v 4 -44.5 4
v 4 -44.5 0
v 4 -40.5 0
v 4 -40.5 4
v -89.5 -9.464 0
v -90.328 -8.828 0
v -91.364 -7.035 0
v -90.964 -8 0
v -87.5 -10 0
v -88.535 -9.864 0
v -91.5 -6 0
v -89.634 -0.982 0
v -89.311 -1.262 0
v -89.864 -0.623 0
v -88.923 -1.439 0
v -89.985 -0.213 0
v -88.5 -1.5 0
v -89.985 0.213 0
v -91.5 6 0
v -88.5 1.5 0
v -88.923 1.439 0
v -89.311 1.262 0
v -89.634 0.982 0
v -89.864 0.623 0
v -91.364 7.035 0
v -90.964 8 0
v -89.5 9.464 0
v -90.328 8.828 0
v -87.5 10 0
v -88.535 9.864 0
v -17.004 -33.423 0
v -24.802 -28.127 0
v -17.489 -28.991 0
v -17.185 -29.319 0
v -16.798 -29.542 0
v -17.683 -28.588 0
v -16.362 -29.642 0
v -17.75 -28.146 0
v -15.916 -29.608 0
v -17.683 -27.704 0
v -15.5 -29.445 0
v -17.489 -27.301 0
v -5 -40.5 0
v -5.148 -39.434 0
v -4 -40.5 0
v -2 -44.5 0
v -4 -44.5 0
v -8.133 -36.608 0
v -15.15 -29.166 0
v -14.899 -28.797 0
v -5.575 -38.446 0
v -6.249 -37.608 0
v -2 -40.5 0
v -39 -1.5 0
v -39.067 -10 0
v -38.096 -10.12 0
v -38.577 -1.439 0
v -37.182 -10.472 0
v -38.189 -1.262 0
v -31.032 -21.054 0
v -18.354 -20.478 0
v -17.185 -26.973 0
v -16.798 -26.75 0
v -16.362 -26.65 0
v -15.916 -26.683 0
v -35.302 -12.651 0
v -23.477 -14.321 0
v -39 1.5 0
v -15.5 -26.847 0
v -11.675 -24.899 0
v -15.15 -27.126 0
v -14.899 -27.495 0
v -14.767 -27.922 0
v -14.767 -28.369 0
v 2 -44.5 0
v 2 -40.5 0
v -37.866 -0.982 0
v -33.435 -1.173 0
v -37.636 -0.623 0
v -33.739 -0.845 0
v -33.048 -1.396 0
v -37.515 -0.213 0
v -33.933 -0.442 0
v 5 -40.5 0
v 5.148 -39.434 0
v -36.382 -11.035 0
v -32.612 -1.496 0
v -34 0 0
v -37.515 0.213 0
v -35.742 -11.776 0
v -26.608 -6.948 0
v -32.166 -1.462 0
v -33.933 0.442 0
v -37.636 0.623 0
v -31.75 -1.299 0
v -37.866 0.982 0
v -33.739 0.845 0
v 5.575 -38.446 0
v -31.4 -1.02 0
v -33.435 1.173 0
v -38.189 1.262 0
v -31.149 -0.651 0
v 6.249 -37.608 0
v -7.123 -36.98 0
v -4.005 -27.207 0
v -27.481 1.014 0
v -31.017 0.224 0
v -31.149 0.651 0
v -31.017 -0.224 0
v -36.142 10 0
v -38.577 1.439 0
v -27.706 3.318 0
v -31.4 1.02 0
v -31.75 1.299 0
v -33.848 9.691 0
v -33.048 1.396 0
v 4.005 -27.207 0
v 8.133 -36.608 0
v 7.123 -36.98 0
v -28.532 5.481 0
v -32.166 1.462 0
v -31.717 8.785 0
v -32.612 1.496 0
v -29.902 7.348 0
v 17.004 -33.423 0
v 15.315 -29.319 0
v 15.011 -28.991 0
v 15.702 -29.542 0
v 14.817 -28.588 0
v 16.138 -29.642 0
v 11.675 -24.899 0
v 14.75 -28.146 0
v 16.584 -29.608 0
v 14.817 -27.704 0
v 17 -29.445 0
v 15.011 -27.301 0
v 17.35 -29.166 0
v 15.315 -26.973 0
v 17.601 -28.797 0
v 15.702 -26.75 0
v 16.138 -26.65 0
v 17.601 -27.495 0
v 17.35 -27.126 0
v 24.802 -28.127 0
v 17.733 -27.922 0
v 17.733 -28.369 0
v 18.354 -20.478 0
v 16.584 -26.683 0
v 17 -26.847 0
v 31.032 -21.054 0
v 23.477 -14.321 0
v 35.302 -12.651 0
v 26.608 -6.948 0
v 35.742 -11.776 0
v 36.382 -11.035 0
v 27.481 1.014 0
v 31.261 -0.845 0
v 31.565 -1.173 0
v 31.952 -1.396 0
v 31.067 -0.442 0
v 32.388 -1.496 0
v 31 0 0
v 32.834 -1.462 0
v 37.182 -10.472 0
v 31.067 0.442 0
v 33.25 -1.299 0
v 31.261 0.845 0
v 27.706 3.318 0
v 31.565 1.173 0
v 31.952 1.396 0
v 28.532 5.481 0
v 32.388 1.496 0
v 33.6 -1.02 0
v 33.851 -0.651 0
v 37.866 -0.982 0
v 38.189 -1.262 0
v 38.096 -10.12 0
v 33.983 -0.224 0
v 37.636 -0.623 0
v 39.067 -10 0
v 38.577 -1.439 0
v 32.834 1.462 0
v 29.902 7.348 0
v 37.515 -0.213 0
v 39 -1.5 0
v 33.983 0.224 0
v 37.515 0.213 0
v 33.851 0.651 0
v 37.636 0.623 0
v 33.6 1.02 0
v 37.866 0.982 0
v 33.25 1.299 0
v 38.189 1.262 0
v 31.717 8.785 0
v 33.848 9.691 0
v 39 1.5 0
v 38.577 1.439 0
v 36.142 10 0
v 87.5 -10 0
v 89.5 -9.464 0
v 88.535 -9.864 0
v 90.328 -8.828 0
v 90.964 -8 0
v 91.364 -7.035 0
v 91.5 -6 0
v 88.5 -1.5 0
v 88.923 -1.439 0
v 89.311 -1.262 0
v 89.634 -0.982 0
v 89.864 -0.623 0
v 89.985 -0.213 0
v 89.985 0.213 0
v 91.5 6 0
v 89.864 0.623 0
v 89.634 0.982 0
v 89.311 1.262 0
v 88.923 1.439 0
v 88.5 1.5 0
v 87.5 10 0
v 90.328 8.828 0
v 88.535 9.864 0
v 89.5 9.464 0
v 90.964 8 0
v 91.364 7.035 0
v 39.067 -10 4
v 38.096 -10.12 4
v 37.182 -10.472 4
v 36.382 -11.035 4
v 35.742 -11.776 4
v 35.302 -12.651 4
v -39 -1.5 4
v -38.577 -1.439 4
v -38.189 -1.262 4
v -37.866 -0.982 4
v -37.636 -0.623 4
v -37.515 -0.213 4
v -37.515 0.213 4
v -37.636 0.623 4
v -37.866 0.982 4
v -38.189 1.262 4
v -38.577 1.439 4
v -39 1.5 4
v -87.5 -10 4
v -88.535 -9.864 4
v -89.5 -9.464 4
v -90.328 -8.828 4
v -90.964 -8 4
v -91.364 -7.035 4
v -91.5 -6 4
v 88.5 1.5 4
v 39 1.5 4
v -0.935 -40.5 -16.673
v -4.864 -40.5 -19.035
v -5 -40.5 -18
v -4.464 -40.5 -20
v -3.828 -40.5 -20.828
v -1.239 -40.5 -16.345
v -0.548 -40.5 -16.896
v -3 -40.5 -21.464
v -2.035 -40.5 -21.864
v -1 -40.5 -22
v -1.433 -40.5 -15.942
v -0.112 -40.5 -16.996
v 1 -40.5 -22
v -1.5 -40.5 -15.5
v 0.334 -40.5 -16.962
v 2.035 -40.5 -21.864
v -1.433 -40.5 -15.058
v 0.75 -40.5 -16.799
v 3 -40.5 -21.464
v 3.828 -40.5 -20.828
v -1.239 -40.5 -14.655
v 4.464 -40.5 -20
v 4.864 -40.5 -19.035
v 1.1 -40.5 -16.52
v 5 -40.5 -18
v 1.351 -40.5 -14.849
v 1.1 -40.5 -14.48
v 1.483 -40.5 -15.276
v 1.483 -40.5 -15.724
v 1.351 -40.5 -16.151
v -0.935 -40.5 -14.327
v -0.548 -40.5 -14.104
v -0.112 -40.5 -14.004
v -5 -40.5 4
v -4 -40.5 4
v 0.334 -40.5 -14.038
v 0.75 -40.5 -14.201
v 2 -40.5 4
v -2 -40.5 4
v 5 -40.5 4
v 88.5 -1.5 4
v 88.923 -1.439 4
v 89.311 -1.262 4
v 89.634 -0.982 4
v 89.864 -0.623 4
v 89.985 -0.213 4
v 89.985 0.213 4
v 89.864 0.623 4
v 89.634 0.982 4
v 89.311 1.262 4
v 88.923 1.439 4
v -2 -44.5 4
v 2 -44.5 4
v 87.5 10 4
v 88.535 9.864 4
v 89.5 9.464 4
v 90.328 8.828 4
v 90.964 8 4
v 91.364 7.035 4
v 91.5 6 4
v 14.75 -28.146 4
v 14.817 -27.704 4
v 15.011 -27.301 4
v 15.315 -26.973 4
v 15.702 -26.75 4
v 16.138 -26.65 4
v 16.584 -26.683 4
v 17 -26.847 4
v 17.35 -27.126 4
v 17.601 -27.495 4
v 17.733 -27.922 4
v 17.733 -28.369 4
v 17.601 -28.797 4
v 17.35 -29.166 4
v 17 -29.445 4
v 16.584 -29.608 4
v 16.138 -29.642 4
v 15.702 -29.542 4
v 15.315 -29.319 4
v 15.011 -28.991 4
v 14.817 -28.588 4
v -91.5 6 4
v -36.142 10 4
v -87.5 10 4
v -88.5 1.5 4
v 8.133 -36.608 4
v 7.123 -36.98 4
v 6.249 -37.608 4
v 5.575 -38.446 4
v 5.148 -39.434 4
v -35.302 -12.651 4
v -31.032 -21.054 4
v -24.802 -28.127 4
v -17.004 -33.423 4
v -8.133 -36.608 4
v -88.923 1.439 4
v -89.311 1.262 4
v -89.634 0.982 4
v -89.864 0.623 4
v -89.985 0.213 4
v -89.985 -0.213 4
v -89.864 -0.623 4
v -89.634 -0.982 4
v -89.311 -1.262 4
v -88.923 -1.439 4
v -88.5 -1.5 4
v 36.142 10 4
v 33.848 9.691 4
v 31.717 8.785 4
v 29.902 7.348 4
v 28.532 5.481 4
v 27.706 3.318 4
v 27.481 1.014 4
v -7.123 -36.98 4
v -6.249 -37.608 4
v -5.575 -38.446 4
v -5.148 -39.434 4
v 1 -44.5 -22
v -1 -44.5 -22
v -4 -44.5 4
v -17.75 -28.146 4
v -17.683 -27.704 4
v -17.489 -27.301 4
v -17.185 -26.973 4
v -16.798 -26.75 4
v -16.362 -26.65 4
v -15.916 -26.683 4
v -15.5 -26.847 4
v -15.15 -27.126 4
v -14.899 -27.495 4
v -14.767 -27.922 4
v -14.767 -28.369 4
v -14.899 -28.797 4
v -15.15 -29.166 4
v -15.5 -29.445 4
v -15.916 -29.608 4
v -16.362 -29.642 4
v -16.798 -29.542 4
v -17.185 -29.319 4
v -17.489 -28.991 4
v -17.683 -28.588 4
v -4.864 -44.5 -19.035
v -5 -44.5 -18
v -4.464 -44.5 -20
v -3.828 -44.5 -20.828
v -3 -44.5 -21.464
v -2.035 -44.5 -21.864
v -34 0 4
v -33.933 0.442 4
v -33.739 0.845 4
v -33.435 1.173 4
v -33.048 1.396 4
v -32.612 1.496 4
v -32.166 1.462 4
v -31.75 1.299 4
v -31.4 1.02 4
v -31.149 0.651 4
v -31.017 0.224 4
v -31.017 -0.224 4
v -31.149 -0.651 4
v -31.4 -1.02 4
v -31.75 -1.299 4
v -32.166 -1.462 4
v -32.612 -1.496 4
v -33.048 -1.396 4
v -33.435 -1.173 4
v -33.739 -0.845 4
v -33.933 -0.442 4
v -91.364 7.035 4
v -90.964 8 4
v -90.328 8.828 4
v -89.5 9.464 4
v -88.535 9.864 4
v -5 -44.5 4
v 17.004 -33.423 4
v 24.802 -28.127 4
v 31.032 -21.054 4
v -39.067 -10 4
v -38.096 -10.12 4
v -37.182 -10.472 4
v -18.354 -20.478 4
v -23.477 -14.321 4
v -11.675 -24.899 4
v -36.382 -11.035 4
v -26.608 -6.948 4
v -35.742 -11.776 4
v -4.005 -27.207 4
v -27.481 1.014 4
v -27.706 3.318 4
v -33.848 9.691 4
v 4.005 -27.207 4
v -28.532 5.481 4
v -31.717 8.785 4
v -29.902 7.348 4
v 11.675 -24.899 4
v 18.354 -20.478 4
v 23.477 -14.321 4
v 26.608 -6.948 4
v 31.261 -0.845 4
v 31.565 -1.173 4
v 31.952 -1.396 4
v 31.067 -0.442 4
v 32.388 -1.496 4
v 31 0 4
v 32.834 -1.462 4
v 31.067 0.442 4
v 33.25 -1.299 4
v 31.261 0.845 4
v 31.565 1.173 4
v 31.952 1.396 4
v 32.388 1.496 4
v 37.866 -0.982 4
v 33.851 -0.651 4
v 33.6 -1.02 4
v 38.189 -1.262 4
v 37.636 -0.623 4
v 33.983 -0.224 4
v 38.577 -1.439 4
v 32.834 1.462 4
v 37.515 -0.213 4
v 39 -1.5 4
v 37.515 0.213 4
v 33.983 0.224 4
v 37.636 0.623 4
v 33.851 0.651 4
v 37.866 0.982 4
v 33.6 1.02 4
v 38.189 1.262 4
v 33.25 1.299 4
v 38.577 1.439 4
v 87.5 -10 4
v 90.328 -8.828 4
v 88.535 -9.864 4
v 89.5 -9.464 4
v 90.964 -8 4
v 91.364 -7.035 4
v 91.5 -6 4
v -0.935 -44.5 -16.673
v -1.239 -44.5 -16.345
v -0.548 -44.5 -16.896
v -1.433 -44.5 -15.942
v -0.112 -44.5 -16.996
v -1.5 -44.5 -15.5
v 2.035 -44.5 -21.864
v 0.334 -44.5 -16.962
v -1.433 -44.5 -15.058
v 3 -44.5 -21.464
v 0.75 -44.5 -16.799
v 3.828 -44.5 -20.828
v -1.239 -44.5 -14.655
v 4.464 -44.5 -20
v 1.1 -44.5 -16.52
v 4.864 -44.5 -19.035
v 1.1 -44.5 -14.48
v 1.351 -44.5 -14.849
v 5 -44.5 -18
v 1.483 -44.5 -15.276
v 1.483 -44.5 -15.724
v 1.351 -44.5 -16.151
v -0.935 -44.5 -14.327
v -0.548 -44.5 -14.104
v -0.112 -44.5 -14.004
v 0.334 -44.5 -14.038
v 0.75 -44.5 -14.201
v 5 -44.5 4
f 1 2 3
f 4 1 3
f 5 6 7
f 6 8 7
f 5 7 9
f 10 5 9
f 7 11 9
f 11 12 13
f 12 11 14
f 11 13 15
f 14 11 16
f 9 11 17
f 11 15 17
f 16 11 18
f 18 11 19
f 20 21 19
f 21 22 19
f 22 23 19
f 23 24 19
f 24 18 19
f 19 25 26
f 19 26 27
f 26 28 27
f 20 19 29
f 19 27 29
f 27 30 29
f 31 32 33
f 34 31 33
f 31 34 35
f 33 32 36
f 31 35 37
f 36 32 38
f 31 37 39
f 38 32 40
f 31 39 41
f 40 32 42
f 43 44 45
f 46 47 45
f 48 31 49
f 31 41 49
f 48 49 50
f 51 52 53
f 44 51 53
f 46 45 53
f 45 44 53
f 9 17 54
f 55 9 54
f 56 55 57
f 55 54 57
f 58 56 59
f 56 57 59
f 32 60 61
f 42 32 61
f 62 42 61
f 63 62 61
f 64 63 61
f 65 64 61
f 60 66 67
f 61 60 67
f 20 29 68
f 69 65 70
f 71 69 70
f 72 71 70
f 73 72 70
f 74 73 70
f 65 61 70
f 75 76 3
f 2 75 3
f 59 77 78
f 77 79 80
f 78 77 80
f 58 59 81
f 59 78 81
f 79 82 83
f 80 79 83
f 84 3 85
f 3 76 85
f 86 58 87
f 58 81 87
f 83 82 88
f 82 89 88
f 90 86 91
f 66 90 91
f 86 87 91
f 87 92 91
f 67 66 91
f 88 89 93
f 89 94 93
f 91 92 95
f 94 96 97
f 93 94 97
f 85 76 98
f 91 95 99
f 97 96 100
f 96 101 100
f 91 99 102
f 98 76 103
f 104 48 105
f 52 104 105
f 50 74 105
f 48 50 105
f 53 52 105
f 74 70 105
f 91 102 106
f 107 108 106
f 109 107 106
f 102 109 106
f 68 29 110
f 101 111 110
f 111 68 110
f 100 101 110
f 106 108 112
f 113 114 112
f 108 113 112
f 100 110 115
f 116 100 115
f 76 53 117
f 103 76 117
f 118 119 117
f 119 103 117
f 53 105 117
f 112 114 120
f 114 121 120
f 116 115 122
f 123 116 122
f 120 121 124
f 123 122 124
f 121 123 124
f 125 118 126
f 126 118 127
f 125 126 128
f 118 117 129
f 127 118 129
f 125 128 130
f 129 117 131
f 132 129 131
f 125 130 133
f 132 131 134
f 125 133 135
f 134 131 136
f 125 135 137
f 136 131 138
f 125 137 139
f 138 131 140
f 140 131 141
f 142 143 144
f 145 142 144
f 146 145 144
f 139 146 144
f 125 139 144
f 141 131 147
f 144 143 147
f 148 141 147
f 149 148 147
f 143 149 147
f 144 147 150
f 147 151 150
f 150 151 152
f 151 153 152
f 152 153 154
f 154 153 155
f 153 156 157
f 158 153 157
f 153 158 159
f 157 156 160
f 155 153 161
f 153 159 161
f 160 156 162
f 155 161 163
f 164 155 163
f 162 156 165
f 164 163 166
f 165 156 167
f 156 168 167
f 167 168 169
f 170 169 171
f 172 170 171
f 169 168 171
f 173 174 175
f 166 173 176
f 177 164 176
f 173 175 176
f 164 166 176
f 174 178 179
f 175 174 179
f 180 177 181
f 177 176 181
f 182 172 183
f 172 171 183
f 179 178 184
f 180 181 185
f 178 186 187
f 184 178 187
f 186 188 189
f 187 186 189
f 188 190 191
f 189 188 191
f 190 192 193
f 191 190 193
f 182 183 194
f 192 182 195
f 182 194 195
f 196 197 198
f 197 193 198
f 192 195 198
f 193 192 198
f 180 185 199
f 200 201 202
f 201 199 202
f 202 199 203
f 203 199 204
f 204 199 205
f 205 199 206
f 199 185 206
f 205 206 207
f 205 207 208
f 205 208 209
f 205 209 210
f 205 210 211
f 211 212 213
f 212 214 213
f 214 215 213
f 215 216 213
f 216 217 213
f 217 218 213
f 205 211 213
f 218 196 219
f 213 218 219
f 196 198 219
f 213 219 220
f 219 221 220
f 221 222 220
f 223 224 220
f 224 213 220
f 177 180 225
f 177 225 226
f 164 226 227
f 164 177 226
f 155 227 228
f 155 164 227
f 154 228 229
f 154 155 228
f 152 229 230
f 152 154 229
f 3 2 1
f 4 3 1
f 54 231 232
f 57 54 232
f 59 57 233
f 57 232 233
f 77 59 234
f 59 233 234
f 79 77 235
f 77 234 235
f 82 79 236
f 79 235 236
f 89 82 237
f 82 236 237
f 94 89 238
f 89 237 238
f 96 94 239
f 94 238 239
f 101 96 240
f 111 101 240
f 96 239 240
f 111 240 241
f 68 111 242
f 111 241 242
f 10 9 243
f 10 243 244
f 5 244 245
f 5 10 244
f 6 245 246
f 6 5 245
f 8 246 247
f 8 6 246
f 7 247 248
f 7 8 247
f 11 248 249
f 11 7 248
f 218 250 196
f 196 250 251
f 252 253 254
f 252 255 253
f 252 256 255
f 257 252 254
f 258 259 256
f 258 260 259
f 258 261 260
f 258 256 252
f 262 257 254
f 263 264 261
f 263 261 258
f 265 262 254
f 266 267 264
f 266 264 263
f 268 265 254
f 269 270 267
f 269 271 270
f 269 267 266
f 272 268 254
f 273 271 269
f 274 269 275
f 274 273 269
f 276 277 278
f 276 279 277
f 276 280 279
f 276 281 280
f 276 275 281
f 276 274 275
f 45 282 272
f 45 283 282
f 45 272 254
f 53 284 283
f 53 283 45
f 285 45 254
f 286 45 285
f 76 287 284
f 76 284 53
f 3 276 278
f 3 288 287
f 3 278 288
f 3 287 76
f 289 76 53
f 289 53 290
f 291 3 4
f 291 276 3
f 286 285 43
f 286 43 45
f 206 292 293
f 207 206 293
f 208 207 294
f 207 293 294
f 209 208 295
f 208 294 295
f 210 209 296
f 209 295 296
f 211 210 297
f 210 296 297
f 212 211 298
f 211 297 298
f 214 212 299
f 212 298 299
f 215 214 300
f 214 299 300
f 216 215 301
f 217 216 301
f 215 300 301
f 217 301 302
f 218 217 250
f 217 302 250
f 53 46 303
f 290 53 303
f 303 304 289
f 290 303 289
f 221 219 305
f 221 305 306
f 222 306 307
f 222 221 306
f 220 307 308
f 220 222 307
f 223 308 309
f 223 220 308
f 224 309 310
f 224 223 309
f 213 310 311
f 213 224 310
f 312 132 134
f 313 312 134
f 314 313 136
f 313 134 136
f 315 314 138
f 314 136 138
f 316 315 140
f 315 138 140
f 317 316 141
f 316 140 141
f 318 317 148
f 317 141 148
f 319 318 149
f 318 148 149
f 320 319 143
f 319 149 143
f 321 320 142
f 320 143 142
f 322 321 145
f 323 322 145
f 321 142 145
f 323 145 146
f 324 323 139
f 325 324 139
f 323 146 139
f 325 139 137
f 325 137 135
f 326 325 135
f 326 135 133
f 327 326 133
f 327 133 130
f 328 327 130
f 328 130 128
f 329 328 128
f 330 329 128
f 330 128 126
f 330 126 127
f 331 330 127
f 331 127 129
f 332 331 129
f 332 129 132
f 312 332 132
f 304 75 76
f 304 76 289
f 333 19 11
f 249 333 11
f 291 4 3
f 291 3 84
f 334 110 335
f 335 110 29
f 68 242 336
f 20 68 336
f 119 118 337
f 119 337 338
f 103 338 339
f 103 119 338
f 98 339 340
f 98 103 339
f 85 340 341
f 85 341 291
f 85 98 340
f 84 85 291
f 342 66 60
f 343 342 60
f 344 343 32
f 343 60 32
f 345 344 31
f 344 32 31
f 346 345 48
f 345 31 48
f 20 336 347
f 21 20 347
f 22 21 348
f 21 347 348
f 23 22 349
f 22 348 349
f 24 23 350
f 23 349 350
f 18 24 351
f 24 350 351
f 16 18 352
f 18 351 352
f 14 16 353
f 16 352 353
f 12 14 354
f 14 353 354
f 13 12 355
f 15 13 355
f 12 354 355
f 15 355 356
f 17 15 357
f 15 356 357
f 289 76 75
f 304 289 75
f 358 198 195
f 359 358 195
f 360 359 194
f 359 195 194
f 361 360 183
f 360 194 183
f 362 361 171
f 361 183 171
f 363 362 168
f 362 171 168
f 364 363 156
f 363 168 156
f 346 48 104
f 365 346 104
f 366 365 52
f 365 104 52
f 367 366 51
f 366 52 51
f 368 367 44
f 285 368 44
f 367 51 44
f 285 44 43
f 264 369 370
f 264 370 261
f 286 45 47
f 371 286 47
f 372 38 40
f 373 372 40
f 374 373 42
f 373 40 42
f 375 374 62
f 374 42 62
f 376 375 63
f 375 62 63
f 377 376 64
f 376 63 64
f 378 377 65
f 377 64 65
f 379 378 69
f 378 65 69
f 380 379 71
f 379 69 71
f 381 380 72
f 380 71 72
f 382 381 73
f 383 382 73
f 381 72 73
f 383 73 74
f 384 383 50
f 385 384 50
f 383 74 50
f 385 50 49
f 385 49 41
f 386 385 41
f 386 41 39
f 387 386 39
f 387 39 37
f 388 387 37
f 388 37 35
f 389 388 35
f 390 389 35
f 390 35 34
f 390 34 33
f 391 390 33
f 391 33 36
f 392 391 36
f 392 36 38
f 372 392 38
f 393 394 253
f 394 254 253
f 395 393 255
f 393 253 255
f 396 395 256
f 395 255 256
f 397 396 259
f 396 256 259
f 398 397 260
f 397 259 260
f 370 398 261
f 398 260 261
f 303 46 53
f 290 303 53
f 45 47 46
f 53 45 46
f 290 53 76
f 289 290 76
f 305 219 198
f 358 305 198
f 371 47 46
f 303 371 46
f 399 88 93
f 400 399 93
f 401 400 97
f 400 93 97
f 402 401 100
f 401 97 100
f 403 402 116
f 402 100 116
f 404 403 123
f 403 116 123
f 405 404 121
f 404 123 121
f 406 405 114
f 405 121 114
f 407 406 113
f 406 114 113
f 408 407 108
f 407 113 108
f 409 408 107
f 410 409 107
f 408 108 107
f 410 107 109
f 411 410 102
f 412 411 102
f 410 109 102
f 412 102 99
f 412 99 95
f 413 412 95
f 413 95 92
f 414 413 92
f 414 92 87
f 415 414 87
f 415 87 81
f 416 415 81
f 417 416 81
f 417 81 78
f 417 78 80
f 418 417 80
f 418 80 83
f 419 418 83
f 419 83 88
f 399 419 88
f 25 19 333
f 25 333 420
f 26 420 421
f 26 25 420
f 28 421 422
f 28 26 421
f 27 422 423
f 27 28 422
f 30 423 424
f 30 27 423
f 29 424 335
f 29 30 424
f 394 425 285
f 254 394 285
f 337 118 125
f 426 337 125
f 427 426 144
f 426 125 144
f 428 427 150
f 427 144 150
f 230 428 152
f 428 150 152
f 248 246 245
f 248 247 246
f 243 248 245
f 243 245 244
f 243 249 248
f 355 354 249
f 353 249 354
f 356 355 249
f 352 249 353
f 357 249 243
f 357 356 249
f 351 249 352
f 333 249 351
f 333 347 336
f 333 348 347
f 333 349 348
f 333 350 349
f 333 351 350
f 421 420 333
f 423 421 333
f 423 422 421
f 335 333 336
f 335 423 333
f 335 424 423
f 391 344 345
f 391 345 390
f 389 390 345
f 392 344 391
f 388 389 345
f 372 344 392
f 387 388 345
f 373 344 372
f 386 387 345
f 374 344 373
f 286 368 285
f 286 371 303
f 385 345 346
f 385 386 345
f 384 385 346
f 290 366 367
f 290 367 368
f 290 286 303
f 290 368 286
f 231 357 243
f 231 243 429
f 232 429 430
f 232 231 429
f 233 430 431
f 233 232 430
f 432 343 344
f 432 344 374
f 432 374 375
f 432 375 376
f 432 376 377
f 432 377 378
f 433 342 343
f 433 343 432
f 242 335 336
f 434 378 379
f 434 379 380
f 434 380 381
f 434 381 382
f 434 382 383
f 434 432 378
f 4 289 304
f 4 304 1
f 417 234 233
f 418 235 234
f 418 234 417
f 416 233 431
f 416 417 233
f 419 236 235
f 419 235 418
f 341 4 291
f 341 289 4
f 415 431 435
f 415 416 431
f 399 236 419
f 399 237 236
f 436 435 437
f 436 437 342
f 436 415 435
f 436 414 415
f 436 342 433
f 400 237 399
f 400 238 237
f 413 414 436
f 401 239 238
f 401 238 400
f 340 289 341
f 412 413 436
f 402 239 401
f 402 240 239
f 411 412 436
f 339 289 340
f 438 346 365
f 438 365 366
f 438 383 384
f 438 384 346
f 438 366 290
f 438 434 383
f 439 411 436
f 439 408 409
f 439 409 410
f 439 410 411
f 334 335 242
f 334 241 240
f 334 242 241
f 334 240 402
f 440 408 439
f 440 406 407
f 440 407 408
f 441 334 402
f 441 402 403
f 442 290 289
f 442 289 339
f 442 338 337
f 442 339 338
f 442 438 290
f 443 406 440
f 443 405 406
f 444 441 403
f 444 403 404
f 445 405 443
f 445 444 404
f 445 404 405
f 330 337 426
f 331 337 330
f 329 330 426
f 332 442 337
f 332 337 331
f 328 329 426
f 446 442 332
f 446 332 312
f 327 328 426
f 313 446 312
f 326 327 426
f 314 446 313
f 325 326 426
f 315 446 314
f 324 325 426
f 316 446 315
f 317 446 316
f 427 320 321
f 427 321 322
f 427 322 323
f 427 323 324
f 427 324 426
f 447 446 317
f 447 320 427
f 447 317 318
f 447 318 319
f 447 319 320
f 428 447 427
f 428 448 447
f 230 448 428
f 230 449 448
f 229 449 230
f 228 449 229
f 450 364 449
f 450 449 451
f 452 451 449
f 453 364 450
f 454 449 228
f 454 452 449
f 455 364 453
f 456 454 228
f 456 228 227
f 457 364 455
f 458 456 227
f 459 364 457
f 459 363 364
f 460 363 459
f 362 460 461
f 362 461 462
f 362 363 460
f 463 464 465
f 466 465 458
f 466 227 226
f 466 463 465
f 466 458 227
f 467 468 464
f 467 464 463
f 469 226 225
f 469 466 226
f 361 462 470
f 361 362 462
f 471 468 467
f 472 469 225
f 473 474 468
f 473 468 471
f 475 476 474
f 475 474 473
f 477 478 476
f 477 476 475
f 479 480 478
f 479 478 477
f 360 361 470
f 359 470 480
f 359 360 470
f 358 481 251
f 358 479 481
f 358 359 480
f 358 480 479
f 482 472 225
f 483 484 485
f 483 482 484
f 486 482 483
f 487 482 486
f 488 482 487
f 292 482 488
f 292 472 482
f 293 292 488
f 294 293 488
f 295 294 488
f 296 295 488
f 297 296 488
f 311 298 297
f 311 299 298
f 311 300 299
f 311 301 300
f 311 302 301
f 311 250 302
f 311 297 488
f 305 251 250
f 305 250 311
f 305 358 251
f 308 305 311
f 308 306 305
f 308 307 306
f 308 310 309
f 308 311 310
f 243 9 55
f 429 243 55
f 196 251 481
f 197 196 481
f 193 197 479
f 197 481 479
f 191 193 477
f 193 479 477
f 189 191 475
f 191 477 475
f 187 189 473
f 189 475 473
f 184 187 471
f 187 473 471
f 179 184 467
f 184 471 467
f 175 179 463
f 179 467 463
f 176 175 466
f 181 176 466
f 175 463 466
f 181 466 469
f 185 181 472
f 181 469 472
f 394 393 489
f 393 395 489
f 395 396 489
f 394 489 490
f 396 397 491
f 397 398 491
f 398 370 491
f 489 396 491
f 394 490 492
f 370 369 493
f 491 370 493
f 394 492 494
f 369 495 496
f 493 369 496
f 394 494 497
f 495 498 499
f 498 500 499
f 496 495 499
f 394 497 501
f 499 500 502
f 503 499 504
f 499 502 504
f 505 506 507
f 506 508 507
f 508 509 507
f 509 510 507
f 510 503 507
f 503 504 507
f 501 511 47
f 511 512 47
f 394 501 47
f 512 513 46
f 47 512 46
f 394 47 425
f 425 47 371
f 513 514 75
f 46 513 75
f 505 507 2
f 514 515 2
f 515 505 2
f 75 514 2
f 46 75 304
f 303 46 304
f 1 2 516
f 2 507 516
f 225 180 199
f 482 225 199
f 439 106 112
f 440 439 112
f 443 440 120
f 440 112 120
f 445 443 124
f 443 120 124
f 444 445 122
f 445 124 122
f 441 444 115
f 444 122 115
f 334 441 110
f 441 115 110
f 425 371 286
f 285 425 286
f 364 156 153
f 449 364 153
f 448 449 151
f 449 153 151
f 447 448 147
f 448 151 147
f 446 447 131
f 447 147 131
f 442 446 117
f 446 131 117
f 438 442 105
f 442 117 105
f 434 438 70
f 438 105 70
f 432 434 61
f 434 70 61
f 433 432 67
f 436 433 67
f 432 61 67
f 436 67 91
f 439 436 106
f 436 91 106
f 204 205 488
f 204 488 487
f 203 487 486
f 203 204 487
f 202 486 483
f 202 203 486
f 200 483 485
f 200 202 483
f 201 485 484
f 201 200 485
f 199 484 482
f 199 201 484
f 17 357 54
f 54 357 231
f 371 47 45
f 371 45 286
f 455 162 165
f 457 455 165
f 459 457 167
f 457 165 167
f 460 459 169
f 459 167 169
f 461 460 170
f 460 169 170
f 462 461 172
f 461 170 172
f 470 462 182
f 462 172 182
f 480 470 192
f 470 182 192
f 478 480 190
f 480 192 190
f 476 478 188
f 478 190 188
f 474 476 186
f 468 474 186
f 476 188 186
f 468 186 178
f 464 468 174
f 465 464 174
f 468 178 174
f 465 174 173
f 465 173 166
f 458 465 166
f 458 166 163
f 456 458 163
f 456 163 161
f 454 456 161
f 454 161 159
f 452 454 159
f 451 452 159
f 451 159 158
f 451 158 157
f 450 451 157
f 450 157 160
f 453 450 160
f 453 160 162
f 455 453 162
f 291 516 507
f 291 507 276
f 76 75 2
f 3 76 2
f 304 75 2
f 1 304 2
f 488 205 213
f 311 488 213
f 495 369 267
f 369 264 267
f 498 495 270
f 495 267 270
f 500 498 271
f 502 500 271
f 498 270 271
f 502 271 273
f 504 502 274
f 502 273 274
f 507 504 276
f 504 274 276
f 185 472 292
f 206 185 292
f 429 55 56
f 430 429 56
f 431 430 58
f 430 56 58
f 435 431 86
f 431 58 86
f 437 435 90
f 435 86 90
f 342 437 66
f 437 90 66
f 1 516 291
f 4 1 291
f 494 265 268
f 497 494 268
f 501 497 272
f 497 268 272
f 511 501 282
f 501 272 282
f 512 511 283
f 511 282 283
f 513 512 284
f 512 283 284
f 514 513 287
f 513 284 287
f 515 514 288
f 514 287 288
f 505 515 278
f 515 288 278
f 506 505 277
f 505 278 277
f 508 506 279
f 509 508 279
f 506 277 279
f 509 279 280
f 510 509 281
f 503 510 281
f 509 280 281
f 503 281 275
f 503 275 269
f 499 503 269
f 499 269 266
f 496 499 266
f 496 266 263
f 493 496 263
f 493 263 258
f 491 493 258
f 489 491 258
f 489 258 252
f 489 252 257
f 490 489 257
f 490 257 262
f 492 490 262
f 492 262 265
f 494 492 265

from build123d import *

# Parameters (mm, degrees)
F1_DEPTH      = 4
F3_D          = 3
F5_DEPTH      = 4
F6_W          = 4
F6_H          = 26
F7_DEPTH      = 5
F7_DEPTH_BACK = 5
F8_T1_DEPTH   = 4
F8_T6_DEPTH   = 4
F8_T11_DEPTH  = 4
F8_T13_DEPTH  = 24
F8_2_F1_R     = 4
F8_2_F2_R     = 4
F10_D         = 3
F11_W         = 2
F11_H         = 4
F12_DEPTH     = 4


# Not quite as in the source:
# - a fillet or chamfer that OpenCascade refuses, or shapes differently, is made with other operations: its cross-section is extruded or revolved along the edge and cut away or added
# - a feature names something its author has since deleted; it is built from what else it names


with BuildPart() as f1:
    # F0 (on Top) → F1 (new body)
    with BuildSketch(Plane.XY):
        with BuildLine():
            ThreePointArc((27.4813056295, 1.0138248848), (0, -27.5), (-27.4813056295, 1.0138248848))
            ThreePointArc((-27.4813056295, 1.0138248848), (-29.9018810474, 7.3475680266), (-36.142080737, 10))
            Line((-36.142080737, 10), (-91.5, 10))
            Line((-91.5, 10), (-91.5, -10))
            Line((-91.5, -10), (-36.142080737, -10))
            ThreePointArc((-36.142080737, -10), (-24.6506458841, -28.2594348404), (-5, -37.1651718683))
            Line((-5, -37.1651718683), (-5, -40.5))
            Line((-5, -40.5), (-4, -40.5))
            Line((-4, -40.5), (-4, -44.5))
            Line((-4, -44.5), (-2, -44.5))
            Line((-2, -44.5), (-2, -40.5))
            Line((-2, -40.5), (2, -40.5))
            Line((2, -40.5), (2, -44.5))
            Line((2, -44.5), (4, -44.5))
            Line((4, -44.5), (4, -40.5))
            Line((4, -40.5), (5, -40.5))
            Line((5, -40.5), (5, -37.1651718683))
            ThreePointArc((5, -37.1651718683), (24.6506458841, -28.2594348404), (36.142080737, -10))
            Line((36.142080737, -10), (91.5, -10))
            Line((91.5, -10), (91.5, 10))
            Line((91.5, 10), (36.142080737, 10))
            ThreePointArc((36.142080737, 10), (29.9018810474, 7.3475680266), (27.4813056295, 1.0138248848))
        make_face()
    extrude(amount=F1_DEPTH)

    # F3 (through all)
    with Locations(Plane.XY.offset(4)):
        with Locations((-32.5, 0), (-16.25, -28.145825623), (16.25, -28.145825623), (32.5, 0)):
            Hole(F3_D / 2)

    # F4 (on face) → F5 (cut, through all)
    with BuildSketch(Plane.XY.offset(4)):
        with BuildLine():
            Line((-39, 1.5), (-88.5, 1.5))
            ThreePointArc((-88.5, 1.5), (-90, 0), (-88.5, -1.5))
            Line((-88.5, -1.5), (-39, -1.5))
            ThreePointArc((-39, -1.5), (-37.5, 0), (-39, 1.5))
        make_face()
        with BuildLine():
            Line((39, -1.5), (88.5, -1.5))
            ThreePointArc((88.5, -1.5), (90, 0), (88.5, 1.5))
            Line((88.5, 1.5), (39, 1.5))
            ThreePointArc((39, 1.5), (37.5, 0), (39, -1.5))
        make_face()
    extrude(amount=-F5_DEPTH, mode=Mode.SUBTRACT)

    # F8: fillet of radius 4 on 10 edges, made by hand

    # F8_s2 → F8_t1 (join)
    with BuildSketch(Plane.XY):
        with BuildLine():
            ThreePointArc((-39.0672497112, -10), (-36.7648151694, -10.7290987204), (-35.3017316668, -12.6506024096))
            ThreePointArc((-35.3017316668, -12.6506024096), (-35.7464824281, -11.3330928709), (-36.142080737, -10))
            Line((-36.142080737, -10), (-39.0672497112, -10))
        make_face()
        with BuildLine():
            ThreePointArc((39.0672497112, -10), (36.7648151694, -10.7290987204), (35.3017316668, -12.6506024096))
            ThreePointArc((35.3017316668, -12.6506024096), (35.7464824281, -11.3330928709), (36.142080737, -10))
            Line((36.142080737, -10), (39.0672497112, -10))
        make_face()
    extrude(amount=F8_T1_DEPTH)


with BuildPart() as f7:
    # F6 (on Right) → F7 (new body, two sides)
    with BuildSketch(Plane.YZ) as f7_sk:
        with Locations((-42.5, -9)):
            Rectangle(F6_W, F6_H)
    extrude(amount=F7_DEPTH)
    extrude(f7_sk.sketch, amount=-F7_DEPTH_BACK)

    # F8#2: fillet of radius 4 on 2 edges, made by hand

    # F8_2_f1
    f8_2_f1_edges = [f7.edges().sort_by_distance(p)[0] for p in [
        (-5, -42.5, -22),
    ]]
    fillet(f8_2_f1_edges, radius=F8_2_F1_R)

    # F8_2_f2
    f8_2_f2_edges = [f7.edges().sort_by_distance(p)[0] for p in [
        (5, -42.5, -22),
    ]]
    fillet(f8_2_f2_edges, radius=F8_2_F2_R)

    # F10 (through all)
    with Locations(Plane.XZ.offset(44.5)):
        with Locations((0, -15.5)):
            Hole(F10_D / 2)

    # F11 (on face) → F12 (cut, through all)
    with BuildSketch(Plane.XZ.offset(44.5)):
        with Locations((3, 2)):
            Rectangle(F11_W, F11_H)
        with Locations((-3, 2)):
            Rectangle(F11_W, F11_H)
    extrude(amount=-F12_DEPTH, mode=Mode.SUBTRACT)


with BuildPart() as f8_tool4:
    # F8_s5 → F8_t6 (new body)
    with BuildSketch(Plane.XY):
        with BuildLine():
            ThreePointArc((8.1325301205, -36.6075395764), (5.8799135014, -38.009333562), (5, -40.5123437979))
            Line((5, -40.5123437979), (5, -37.1651718683))
            ThreePointArc((5, -37.1651718683), (6.5721819272, -36.9195940486), (8.1325301205, -36.6075395764))
        make_face()
    extrude(amount=F8_T6_DEPTH)

    split(bisect_by=Plane.XZ.offset(40.5), keep=Keep.BOTTOM)


with BuildPart() as f1_1:
    add(f1.part)

    # F8_t3: union F8_tool4
    add(f8_tool4.part)


with BuildPart() as f8_tool9:
    # F8_s10 → F8_t11 (new body)
    with BuildSketch(Plane.XY):
        with BuildLine():
            ThreePointArc((-8.1325301205, -36.6075395764), (-5.8799135014, -38.009333562), (-5, -40.5123437979))
            Line((-5, -40.5123437979), (-5, -37.1651718683))
            ThreePointArc((-5, -37.1651718683), (-6.5721819272, -36.9195940486), (-8.1325301205, -36.6075395764))
        make_face()
    extrude(amount=F8_T11_DEPTH)

    split(bisect_by=Plane.XZ.offset(40.5), keep=Keep.BOTTOM)


with BuildPart() as f1_2:
    add(f1_1.part)

    # F8_t8: union F8_tool9
    add(f8_tool9.part)

    # F8_s14 → F8_t13 (cut)
    with BuildSketch(Plane.XY.offset(-10)):
        with BuildLine():
            ThreePointArc((91.5, -6), (90.3284271247, -8.8284271247), (87.5, -10))
            Line((87.5, -10), (91.5, -10))
            Line((91.5, -10), (91.5, -6))
        make_face()
        with BuildLine():
            ThreePointArc((-91.5, 6), (-90.3284271247, 8.8284271247), (-87.5, 10))
            Line((-87.5, 10), (-91.5, 10))
            Line((-91.5, 10), (-91.5, 6))
        make_face()
        with BuildLine():
            ThreePointArc((-87.5, -10), (-90.3284271247, -8.8284271247), (-91.5, -6))
            Line((-91.5, -6), (-91.5, -10))
            Line((-91.5, -10), (-87.5, -10))
        make_face()
        with BuildLine():
            ThreePointArc((87.5, 10), (90.3284271247, 8.8284271247), (91.5, 6))
            Line((91.5, 6), (91.5, 10))
            Line((91.5, 10), (87.5, 10))
        make_face()
    extrude(amount=F8_T13_DEPTH, mode=Mode.SUBTRACT)


solid = Compound([f7.part, f1_2.part])
